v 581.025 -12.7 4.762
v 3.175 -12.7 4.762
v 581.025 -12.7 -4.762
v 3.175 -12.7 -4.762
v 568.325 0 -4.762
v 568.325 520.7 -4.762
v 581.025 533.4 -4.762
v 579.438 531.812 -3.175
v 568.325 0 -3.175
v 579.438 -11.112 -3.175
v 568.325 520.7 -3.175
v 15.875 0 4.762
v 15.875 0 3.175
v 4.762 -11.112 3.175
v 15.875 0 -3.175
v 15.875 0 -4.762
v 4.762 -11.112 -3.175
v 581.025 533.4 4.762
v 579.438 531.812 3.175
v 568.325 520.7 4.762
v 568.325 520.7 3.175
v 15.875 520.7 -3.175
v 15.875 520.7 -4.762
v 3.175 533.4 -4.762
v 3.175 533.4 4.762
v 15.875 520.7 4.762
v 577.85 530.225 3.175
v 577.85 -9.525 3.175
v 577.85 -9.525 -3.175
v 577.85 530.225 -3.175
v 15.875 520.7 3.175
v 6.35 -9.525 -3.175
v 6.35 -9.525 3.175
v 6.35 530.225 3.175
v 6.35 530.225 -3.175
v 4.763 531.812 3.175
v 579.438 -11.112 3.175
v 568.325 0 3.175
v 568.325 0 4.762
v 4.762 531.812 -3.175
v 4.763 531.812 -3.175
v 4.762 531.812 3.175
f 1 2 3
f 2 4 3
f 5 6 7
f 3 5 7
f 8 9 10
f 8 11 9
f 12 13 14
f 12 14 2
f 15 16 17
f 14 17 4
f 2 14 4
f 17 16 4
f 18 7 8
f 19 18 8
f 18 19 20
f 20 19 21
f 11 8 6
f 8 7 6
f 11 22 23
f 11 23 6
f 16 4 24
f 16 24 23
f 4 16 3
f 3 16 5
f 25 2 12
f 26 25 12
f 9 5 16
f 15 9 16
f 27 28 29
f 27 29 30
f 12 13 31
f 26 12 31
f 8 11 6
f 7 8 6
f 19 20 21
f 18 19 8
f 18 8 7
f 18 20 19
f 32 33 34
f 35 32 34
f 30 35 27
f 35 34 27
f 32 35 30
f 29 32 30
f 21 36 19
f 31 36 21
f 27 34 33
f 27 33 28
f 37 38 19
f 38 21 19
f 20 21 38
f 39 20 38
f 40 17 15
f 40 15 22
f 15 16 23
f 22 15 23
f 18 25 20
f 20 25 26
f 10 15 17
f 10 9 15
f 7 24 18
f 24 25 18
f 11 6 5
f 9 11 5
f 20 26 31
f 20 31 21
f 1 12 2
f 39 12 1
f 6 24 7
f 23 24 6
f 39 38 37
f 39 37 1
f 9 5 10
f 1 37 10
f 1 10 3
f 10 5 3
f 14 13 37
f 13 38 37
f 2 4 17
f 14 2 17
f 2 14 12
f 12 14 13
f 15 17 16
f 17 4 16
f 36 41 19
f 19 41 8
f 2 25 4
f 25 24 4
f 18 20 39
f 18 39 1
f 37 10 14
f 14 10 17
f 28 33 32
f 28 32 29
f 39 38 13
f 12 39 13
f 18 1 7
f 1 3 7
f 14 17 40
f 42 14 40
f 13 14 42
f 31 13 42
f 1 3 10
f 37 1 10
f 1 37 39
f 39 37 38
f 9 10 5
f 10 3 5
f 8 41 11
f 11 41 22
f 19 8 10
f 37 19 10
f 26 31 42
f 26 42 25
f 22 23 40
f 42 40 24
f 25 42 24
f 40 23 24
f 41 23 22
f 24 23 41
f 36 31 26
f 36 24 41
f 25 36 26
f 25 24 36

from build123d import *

# Parameters (mm, degrees)
SKETCH2_W               = 577.85
SKETCH2_H               = 546.1
BOSS_EXTRUDE1_DEPTH     = 4.7625
SKETCH3_W               = 552.45
SKETCH3_H               = 520.7
CUT_EXTRUDE1_DEPTH      = 789.794229346
CUT_EXTRUDE2_DEPTH      = 3.175
CUT_EXTRUDE2_DEPTH_BACK = 3.175
SKETCH4_W               = 574.675
SKETCH4_H               = 542.925
SPLIT1_START            = -4.7625
SPLIT1_DEPTH            = 1.5875
SPLIT1_START_2          = 3.175
SPLIT1_2_DEPTH          = 1.5875
SPLIT1_START_3          = -3.175
SPLIT1_3_DEPTH          = 6.35
SPLIT1_START_4          = -374.925693055
SPLIT1_4_OUTLINE_W      = 387.415821115
SPLIT1_4_OUTLINE_H      = 9.525
SPLIT1_4_DEPTH          = 776.792154473
SPLIT1_START_5          = 33.675960454
SPLIT1_5_OUTLINE_W      = 410.584178885
SPLIT1_5_OUTLINE_H      = 9.525
SPLIT1_5_DEPTH          = 386.151013206
SPLIT1_6_DEPTH          = 1.5875
SPLIT1_7_DEPTH          = 1.5875
SPLIT1_8_DEPTH          = 6.35
SPLIT1_9_DEPTH          = 1.5875
SPLIT1_10_DEPTH         = 1.5875
SPLIT1_11_DEPTH         = 6.35
SKETCH6_W               = 571.5
SKETCH6_H               = 539.75
BOSS_EXTRUDE2_DEPTH     = 3.175


# Read off the part's stored shape, not the designer's step: Split1
with BuildPart() as part:
    # Sketch2 → Boss-Extrude1 (new, symmetric)
    with BuildSketch(Plane.XY):
        with Locations((292.1, 260.35)):
            Rectangle(SKETCH2_W, SKETCH2_H)
    extrude(amount=BOSS_EXTRUDE1_DEPTH, both=True)

    # Sketch3 → Cut-Extrude1 (cut, through all)
    with BuildSketch(Plane.XY.offset(4.7625)):
        with Locations((292.1, 260.35)):
            Rectangle(SKETCH3_W, SKETCH3_H)
    extrude(amount=-CUT_EXTRUDE1_DEPTH, mode=Mode.SUBTRACT)

    # Sketch4 → Cut-Extrude2 (cut, two sides: drawn at the far end of the back side and taken through both)
    with BuildSketch(Plane.XY.offset(-CUT_EXTRUDE2_DEPTH_BACK)):
        with Locations((292.1, 260.35)):
            Rectangle(SKETCH4_W, SKETCH4_H)
    extrude(amount=CUT_EXTRUDE2_DEPTH + CUT_EXTRUDE2_DEPTH_BACK, mode=Mode.SUBTRACT)

    # Split1 4 outline → Split1 4 (cut)
    with BuildSketch(Plane(origin=(0, 0, 0), x_dir=(0.7071067811865474, 0.7071067811865477, 0), z_dir=(0.7071067811865476, -0.7071067811865476, 0)).offset(SPLIT1_START_4)):
        with Locations((185.707910558, 0)):
            Rectangle(SPLIT1_4_OUTLINE_W, SPLIT1_4_OUTLINE_H)
    extrude(amount=SPLIT1_4_DEPTH, mode=Mode.SUBTRACT)

    # Split1 5 outline → Split1 5 (cut)
    with BuildSketch(Plane(origin=(0, 0, 0), x_dir=(0.7071067811865474, 0.7071067811865477, 0), z_dir=(0.7071067811865476, -0.7071067811865476, 0)).offset(SPLIT1_START_5)):
        with Locations((584.707910557, 0)):
            Rectangle(SPLIT1_5_OUTLINE_W, SPLIT1_5_OUTLINE_H)
    extrude(amount=SPLIT1_5_DEPTH, mode=Mode.SUBTRACT)


with BuildPart() as body_2:
    # Split1 outline → Split1 (new body)
    with BuildSketch(Plane.XY.offset(SPLIT1_START)):
        Polygon((3.175, 533.4), (3.175, -12.7), (15.875, 0), (15.875, 520.7), align=None)
    extrude(amount=SPLIT1_DEPTH)

    # Split1 2 outline → Split1 2 (add)
    with BuildSketch(Plane.XY.offset(SPLIT1_START_2)):
        Polygon((3.175, 533.4), (3.175, -12.7), (15.875, 0), (15.875, 520.7), align=None)
    extrude(amount=SPLIT1_2_DEPTH)

    # Split1 3 outline → Split1 3 (add)
    with BuildSketch(Plane.XY.offset(SPLIT1_START_3)):
        Polygon((4.7625, 531.8125), (3.175, 533.4), (3.175, -12.7), (4.7625, -11.1125), align=None)
    extrude(amount=SPLIT1_3_DEPTH)


with BuildPart() as body_3:
    # Split1 6 outline → Split1 6 (new body)
    with BuildSketch(Plane.XY.offset(SPLIT1_START)):
        Polygon((581.025, -12.7), (581.025, 533.4), (568.325, 520.7), (568.325, 0), align=None)
    extrude(amount=SPLIT1_6_DEPTH)

    # Split1 7 outline → Split1 7 (add)
    with BuildSketch(Plane.XY.offset(SPLIT1_START_2)):
        Polygon((581.025, -12.7), (581.025, 533.4), (568.325, 520.7), (568.325, 0), align=None)
    extrude(amount=SPLIT1_7_DEPTH)

    # Split1 8 outline → Split1 8 (add)
    with BuildSketch(Plane.XY.offset(SPLIT1_START_3)):
        Polygon((579.4375, -11.1125), (581.025, -12.7), (581.025, 533.4), (579.4375, 531.8125), align=None)
    extrude(amount=SPLIT1_8_DEPTH)


with BuildPart() as body_4:
    # Split1 9 outline → Split1 9 (new body)
    with BuildSketch(Plane.XY.offset(SPLIT1_START)):
        Polygon((3.175, -12.7), (581.025, -12.7), (568.325, 0), (15.875, 0), align=None)
    extrude(amount=SPLIT1_9_DEPTH)

    # Split1 10 outline → Split1 10 (add)
    with BuildSketch(Plane.XY.offset(SPLIT1_START_2)):
        Polygon((3.175, -12.7), (581.025, -12.7), (568.325, 0), (15.875, 0), align=None)
    extrude(amount=SPLIT1_10_DEPTH)

    # Split1 11 outline → Split1 11 (add)
    with BuildSketch(Plane.XY.offset(SPLIT1_START_3)):
        Polygon((4.7625, -11.1125), (3.175, -12.7), (581.025, -12.7), (579.4375, -11.1125), align=None)
    extrude(amount=SPLIT1_11_DEPTH)


with BuildPart() as body_5:
    # Sketch6 → Boss-Extrude2 (new, symmetric)
    with BuildSketch(Plane.XY):
        with Locations((292.1, 260.35)):
            Rectangle(SKETCH6_W, SKETCH6_H)
    extrude(amount=BOSS_EXTRUDE2_DEPTH, both=True)


solid = Compound([part.part, body_2.part, body_3.part, body_4.part, body_5.part])
